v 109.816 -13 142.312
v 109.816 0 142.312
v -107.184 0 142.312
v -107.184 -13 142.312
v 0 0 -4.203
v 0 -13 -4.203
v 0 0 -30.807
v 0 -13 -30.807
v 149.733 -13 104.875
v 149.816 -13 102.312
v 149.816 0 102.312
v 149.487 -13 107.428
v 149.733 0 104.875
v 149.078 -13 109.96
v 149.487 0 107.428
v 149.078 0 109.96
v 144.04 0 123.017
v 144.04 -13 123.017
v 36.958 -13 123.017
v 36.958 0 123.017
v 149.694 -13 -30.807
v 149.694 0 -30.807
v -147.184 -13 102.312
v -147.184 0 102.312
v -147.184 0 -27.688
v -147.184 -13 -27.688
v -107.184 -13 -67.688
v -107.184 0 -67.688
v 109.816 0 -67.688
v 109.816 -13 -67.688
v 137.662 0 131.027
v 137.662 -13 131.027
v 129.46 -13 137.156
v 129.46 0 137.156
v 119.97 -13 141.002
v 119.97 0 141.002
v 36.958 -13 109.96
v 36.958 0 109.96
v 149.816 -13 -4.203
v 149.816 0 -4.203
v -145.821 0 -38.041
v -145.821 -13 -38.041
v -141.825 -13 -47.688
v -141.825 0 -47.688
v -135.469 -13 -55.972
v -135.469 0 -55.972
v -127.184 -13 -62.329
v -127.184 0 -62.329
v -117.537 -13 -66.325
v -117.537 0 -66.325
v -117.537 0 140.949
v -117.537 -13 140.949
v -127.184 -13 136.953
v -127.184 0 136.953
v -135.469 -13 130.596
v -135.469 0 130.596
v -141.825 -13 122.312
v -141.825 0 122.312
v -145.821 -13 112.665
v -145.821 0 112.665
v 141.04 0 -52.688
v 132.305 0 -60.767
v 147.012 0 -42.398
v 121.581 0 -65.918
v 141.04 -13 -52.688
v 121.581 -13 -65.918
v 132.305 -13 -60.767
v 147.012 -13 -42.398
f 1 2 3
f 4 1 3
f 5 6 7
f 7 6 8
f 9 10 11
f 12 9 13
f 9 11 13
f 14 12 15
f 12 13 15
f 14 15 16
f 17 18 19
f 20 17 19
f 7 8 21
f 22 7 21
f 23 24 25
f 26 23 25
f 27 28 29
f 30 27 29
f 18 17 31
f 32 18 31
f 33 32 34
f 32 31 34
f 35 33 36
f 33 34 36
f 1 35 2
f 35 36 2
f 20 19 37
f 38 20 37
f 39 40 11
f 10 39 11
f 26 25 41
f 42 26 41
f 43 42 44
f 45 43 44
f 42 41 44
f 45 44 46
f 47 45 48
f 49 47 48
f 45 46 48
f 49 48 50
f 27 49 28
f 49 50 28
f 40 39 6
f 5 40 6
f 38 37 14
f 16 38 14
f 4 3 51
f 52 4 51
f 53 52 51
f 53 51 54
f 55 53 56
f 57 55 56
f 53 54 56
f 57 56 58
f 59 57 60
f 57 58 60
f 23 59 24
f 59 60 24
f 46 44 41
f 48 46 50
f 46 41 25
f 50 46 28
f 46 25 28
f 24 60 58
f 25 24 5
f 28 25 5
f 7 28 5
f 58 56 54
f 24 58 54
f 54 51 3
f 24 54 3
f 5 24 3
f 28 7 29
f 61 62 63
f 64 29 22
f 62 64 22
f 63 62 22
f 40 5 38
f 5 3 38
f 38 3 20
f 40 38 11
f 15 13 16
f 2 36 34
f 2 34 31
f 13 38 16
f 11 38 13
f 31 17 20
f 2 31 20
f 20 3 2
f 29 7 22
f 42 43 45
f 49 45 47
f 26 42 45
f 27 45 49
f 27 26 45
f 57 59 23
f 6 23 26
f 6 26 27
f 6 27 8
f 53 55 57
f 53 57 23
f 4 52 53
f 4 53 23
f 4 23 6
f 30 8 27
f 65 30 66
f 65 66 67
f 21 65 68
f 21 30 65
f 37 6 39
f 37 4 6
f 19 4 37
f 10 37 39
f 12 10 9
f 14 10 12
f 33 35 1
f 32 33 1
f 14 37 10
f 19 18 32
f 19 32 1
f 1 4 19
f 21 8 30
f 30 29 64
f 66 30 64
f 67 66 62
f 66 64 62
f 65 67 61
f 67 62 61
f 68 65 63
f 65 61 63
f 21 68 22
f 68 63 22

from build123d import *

# Parameters (mm, degrees)
F1_DEPTH = 13
F3_DEPTH = 25
F5_DEPTH = 25


with BuildPart() as f1:
    # F0 (on Front) → F1 (new body)
    with BuildSketch(Plane.XZ):
        with BuildLine():
            Line((109.81556, 142.312214), (-107.18444, 142.312214))
            ThreePointArc((-107.18444, 142.312214), (-135.468711, 130.596485), (-147.18444, 102.312214))
            Line((-147.18444, 102.312214), (-147.18444, -27.687786))
            ThreePointArc((-147.18444, -27.687786), (-135.468711, -55.972058), (-107.18444, -67.687786))
            Line((-107.18444, -67.687786), (109.81556, -67.687786))
            ThreePointArc((109.81556, -67.687786), (138.099831, -55.972058), (149.81556, -27.687786))
            Line((149.81556, -27.687786), (149.81556, 102.312214))
            ThreePointArc((149.81556, 102.312214), (138.099831, 130.596485), (109.81556, 142.312214))
        make_face()
    extrude(amount=F1_DEPTH)

    # F2 (on face) → F3 (cut)
    with BuildSketch(Plane.XZ.offset(13)):
        with BuildLine():
            Line((149.81556, -27.687786), (149.81556, -4.202998))
            Line((149.81556, -4.202998), (0, -4.202998))
            Line((0, -4.202998), (0, -30.806687))
            Line((0, -30.806687), (149.693781, -30.806687))
            ThreePointArc((149.693781, -30.806687), (149.785104, -29.248425), (149.81556, -27.687786))
        make_face()
    extrude(amount=-F3_DEPTH, mode=Mode.SUBTRACT)

    # F4 (on face) → F5 (cut)
    with BuildSketch(Plane.XZ.offset(13)):
        with BuildLine():
            Line((36.957689, 109.959573), (149.077729, 109.959573))
            ThreePointArc((149.077729, 109.959573), (147.134331, 116.710454), (144.039855, 123.017229))
            Line((144.039855, 123.017229), (36.957689, 123.017229))
            Line((36.957689, 123.017229), (36.957689, 109.959573))
        make_face()
    extrude(amount=-F5_DEPTH, mode=Mode.SUBTRACT)


solid = f1.part
